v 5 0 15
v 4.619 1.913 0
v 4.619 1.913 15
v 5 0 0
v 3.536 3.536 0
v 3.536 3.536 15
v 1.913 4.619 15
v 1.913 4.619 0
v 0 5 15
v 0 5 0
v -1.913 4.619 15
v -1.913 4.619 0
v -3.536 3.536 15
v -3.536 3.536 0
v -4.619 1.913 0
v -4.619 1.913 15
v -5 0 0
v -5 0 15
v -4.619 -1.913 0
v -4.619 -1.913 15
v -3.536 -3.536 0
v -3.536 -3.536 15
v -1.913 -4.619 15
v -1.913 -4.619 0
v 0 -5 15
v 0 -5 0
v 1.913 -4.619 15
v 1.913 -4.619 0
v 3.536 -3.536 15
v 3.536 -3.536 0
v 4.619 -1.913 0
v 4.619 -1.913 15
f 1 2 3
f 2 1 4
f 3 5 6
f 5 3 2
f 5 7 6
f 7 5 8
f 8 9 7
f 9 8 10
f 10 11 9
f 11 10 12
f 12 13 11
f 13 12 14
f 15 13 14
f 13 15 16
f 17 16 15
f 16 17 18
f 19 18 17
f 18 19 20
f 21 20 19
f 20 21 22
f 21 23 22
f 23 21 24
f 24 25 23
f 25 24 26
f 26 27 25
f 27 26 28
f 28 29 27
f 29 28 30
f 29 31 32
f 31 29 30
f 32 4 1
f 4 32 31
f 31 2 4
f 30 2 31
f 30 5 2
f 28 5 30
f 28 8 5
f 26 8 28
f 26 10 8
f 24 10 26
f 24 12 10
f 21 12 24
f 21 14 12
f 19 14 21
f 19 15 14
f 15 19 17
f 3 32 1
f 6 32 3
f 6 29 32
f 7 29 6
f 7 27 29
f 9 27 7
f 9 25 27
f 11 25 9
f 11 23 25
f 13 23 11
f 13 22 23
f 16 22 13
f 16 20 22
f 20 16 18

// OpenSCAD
// Generated by SolidPython 1.0.1 on 2020-07-29 00:46:44


cylinder(h = 15, r1 = 5, r2 = 5);
/***********************************************
*********      SolidPython code:      **********
************************************************
 
# import packages: SolidPython
from solid import *
from solid.utils import *
from itertools import chain, combinations, permutations


class Resize:

    def __init__(self, scad_file):
        self.scad_file = scad_file
        #self.scad_file = import_scad(scad_file)
        # cone/cylinder param:
        self.r1 = 0
        self.r2 = 0
        self.h = 0
        # rectangular prism param:
        self.w = 0
        self.l = 0
        # ellipse param:
        self.r = 0

    # import OpenScad code (file name corresponds to shape)


    # classify shape + parameters
    def assign(self, param1, param2, param3):
        if self.scad_file == 'cone.scad':
            self.r1 = param1
            self.r2 = param2
            self.h = param3
        elif self.scad_file == 'cylinder.scad':
            self.r1 = param1
            self.r2 = param2
            self.h = param3
        elif self.scad_file == 'rectangularPrism.scad':
            self.h = param1
            self.l = param2
            self.w = param3
        else:
            self.r = param1
            self.h = param2

    # resize parameters
    def iterate(self):
        x = range(3, 20, 2)
        i = 1
        if self.scad_file == 'cone.scad':
            tempList = list(permutations(x, 2))
            for temp in tempList:
                param1 = temp[0]
                param2 = temp[1]
                filepath = 'produced_scad_files/' + 'cone' + str(param1) + '_' + str(param2) + '_' + '.scad'
                scad_render_to_file(cylinder(h=param1, r1=param2, r2=0), filepath)

        elif self.scad_file == 'cylinder.scad':
            tempList = list(permutations(x, 3))
            for temp in tempList:
                param1 = temp[0]
                param2 = temp[1]
                filepath = 'produced_scad_files/' + 'cylinder' + str(param1) + '_' + str(param2) + '_' + '.scad'
                scad_render_to_file(cylinder(h=param1, r1=param2, r2=param2), filepath)

        elif self.scad_file == 'rectangularPrism.scad':
            tempList = list(permutations(x, 3))
            for temp in tempList:
                param1 = temp[0]
                param2 = temp[1]
                param3 = temp[2]
                filepath = 'produced_scad_files/' + 'rectangularPrism' + str(param1) + '_' + str(param2) + '_' + str(
                    param3) + '.scad'
                scad_render_to_file(cube(size=(param1, param2, param3)), filepath)

        elif self.scad_file == 'ellipse.scad':
            tempList = list(permutations(x, 4))
            for temp in tempList:
                param1 = temp[0]
                param2 = temp[1]
                param3 = temp[2]
                param4 = temp[3]
                filepath = 'produced_scad_files/' + 'ellipse' + str(param1) + '_' + str(param2) + '_' + str(param3) + '_' + str(param4) + '.scad'
                scad_render_to_file(scale([param1, param2, param3])(sphere(r=param4)), filepath)

    def render_to_scadfile(self):
        scad_render_to_file(scad, 'example.scad') 
 
************************************************/
